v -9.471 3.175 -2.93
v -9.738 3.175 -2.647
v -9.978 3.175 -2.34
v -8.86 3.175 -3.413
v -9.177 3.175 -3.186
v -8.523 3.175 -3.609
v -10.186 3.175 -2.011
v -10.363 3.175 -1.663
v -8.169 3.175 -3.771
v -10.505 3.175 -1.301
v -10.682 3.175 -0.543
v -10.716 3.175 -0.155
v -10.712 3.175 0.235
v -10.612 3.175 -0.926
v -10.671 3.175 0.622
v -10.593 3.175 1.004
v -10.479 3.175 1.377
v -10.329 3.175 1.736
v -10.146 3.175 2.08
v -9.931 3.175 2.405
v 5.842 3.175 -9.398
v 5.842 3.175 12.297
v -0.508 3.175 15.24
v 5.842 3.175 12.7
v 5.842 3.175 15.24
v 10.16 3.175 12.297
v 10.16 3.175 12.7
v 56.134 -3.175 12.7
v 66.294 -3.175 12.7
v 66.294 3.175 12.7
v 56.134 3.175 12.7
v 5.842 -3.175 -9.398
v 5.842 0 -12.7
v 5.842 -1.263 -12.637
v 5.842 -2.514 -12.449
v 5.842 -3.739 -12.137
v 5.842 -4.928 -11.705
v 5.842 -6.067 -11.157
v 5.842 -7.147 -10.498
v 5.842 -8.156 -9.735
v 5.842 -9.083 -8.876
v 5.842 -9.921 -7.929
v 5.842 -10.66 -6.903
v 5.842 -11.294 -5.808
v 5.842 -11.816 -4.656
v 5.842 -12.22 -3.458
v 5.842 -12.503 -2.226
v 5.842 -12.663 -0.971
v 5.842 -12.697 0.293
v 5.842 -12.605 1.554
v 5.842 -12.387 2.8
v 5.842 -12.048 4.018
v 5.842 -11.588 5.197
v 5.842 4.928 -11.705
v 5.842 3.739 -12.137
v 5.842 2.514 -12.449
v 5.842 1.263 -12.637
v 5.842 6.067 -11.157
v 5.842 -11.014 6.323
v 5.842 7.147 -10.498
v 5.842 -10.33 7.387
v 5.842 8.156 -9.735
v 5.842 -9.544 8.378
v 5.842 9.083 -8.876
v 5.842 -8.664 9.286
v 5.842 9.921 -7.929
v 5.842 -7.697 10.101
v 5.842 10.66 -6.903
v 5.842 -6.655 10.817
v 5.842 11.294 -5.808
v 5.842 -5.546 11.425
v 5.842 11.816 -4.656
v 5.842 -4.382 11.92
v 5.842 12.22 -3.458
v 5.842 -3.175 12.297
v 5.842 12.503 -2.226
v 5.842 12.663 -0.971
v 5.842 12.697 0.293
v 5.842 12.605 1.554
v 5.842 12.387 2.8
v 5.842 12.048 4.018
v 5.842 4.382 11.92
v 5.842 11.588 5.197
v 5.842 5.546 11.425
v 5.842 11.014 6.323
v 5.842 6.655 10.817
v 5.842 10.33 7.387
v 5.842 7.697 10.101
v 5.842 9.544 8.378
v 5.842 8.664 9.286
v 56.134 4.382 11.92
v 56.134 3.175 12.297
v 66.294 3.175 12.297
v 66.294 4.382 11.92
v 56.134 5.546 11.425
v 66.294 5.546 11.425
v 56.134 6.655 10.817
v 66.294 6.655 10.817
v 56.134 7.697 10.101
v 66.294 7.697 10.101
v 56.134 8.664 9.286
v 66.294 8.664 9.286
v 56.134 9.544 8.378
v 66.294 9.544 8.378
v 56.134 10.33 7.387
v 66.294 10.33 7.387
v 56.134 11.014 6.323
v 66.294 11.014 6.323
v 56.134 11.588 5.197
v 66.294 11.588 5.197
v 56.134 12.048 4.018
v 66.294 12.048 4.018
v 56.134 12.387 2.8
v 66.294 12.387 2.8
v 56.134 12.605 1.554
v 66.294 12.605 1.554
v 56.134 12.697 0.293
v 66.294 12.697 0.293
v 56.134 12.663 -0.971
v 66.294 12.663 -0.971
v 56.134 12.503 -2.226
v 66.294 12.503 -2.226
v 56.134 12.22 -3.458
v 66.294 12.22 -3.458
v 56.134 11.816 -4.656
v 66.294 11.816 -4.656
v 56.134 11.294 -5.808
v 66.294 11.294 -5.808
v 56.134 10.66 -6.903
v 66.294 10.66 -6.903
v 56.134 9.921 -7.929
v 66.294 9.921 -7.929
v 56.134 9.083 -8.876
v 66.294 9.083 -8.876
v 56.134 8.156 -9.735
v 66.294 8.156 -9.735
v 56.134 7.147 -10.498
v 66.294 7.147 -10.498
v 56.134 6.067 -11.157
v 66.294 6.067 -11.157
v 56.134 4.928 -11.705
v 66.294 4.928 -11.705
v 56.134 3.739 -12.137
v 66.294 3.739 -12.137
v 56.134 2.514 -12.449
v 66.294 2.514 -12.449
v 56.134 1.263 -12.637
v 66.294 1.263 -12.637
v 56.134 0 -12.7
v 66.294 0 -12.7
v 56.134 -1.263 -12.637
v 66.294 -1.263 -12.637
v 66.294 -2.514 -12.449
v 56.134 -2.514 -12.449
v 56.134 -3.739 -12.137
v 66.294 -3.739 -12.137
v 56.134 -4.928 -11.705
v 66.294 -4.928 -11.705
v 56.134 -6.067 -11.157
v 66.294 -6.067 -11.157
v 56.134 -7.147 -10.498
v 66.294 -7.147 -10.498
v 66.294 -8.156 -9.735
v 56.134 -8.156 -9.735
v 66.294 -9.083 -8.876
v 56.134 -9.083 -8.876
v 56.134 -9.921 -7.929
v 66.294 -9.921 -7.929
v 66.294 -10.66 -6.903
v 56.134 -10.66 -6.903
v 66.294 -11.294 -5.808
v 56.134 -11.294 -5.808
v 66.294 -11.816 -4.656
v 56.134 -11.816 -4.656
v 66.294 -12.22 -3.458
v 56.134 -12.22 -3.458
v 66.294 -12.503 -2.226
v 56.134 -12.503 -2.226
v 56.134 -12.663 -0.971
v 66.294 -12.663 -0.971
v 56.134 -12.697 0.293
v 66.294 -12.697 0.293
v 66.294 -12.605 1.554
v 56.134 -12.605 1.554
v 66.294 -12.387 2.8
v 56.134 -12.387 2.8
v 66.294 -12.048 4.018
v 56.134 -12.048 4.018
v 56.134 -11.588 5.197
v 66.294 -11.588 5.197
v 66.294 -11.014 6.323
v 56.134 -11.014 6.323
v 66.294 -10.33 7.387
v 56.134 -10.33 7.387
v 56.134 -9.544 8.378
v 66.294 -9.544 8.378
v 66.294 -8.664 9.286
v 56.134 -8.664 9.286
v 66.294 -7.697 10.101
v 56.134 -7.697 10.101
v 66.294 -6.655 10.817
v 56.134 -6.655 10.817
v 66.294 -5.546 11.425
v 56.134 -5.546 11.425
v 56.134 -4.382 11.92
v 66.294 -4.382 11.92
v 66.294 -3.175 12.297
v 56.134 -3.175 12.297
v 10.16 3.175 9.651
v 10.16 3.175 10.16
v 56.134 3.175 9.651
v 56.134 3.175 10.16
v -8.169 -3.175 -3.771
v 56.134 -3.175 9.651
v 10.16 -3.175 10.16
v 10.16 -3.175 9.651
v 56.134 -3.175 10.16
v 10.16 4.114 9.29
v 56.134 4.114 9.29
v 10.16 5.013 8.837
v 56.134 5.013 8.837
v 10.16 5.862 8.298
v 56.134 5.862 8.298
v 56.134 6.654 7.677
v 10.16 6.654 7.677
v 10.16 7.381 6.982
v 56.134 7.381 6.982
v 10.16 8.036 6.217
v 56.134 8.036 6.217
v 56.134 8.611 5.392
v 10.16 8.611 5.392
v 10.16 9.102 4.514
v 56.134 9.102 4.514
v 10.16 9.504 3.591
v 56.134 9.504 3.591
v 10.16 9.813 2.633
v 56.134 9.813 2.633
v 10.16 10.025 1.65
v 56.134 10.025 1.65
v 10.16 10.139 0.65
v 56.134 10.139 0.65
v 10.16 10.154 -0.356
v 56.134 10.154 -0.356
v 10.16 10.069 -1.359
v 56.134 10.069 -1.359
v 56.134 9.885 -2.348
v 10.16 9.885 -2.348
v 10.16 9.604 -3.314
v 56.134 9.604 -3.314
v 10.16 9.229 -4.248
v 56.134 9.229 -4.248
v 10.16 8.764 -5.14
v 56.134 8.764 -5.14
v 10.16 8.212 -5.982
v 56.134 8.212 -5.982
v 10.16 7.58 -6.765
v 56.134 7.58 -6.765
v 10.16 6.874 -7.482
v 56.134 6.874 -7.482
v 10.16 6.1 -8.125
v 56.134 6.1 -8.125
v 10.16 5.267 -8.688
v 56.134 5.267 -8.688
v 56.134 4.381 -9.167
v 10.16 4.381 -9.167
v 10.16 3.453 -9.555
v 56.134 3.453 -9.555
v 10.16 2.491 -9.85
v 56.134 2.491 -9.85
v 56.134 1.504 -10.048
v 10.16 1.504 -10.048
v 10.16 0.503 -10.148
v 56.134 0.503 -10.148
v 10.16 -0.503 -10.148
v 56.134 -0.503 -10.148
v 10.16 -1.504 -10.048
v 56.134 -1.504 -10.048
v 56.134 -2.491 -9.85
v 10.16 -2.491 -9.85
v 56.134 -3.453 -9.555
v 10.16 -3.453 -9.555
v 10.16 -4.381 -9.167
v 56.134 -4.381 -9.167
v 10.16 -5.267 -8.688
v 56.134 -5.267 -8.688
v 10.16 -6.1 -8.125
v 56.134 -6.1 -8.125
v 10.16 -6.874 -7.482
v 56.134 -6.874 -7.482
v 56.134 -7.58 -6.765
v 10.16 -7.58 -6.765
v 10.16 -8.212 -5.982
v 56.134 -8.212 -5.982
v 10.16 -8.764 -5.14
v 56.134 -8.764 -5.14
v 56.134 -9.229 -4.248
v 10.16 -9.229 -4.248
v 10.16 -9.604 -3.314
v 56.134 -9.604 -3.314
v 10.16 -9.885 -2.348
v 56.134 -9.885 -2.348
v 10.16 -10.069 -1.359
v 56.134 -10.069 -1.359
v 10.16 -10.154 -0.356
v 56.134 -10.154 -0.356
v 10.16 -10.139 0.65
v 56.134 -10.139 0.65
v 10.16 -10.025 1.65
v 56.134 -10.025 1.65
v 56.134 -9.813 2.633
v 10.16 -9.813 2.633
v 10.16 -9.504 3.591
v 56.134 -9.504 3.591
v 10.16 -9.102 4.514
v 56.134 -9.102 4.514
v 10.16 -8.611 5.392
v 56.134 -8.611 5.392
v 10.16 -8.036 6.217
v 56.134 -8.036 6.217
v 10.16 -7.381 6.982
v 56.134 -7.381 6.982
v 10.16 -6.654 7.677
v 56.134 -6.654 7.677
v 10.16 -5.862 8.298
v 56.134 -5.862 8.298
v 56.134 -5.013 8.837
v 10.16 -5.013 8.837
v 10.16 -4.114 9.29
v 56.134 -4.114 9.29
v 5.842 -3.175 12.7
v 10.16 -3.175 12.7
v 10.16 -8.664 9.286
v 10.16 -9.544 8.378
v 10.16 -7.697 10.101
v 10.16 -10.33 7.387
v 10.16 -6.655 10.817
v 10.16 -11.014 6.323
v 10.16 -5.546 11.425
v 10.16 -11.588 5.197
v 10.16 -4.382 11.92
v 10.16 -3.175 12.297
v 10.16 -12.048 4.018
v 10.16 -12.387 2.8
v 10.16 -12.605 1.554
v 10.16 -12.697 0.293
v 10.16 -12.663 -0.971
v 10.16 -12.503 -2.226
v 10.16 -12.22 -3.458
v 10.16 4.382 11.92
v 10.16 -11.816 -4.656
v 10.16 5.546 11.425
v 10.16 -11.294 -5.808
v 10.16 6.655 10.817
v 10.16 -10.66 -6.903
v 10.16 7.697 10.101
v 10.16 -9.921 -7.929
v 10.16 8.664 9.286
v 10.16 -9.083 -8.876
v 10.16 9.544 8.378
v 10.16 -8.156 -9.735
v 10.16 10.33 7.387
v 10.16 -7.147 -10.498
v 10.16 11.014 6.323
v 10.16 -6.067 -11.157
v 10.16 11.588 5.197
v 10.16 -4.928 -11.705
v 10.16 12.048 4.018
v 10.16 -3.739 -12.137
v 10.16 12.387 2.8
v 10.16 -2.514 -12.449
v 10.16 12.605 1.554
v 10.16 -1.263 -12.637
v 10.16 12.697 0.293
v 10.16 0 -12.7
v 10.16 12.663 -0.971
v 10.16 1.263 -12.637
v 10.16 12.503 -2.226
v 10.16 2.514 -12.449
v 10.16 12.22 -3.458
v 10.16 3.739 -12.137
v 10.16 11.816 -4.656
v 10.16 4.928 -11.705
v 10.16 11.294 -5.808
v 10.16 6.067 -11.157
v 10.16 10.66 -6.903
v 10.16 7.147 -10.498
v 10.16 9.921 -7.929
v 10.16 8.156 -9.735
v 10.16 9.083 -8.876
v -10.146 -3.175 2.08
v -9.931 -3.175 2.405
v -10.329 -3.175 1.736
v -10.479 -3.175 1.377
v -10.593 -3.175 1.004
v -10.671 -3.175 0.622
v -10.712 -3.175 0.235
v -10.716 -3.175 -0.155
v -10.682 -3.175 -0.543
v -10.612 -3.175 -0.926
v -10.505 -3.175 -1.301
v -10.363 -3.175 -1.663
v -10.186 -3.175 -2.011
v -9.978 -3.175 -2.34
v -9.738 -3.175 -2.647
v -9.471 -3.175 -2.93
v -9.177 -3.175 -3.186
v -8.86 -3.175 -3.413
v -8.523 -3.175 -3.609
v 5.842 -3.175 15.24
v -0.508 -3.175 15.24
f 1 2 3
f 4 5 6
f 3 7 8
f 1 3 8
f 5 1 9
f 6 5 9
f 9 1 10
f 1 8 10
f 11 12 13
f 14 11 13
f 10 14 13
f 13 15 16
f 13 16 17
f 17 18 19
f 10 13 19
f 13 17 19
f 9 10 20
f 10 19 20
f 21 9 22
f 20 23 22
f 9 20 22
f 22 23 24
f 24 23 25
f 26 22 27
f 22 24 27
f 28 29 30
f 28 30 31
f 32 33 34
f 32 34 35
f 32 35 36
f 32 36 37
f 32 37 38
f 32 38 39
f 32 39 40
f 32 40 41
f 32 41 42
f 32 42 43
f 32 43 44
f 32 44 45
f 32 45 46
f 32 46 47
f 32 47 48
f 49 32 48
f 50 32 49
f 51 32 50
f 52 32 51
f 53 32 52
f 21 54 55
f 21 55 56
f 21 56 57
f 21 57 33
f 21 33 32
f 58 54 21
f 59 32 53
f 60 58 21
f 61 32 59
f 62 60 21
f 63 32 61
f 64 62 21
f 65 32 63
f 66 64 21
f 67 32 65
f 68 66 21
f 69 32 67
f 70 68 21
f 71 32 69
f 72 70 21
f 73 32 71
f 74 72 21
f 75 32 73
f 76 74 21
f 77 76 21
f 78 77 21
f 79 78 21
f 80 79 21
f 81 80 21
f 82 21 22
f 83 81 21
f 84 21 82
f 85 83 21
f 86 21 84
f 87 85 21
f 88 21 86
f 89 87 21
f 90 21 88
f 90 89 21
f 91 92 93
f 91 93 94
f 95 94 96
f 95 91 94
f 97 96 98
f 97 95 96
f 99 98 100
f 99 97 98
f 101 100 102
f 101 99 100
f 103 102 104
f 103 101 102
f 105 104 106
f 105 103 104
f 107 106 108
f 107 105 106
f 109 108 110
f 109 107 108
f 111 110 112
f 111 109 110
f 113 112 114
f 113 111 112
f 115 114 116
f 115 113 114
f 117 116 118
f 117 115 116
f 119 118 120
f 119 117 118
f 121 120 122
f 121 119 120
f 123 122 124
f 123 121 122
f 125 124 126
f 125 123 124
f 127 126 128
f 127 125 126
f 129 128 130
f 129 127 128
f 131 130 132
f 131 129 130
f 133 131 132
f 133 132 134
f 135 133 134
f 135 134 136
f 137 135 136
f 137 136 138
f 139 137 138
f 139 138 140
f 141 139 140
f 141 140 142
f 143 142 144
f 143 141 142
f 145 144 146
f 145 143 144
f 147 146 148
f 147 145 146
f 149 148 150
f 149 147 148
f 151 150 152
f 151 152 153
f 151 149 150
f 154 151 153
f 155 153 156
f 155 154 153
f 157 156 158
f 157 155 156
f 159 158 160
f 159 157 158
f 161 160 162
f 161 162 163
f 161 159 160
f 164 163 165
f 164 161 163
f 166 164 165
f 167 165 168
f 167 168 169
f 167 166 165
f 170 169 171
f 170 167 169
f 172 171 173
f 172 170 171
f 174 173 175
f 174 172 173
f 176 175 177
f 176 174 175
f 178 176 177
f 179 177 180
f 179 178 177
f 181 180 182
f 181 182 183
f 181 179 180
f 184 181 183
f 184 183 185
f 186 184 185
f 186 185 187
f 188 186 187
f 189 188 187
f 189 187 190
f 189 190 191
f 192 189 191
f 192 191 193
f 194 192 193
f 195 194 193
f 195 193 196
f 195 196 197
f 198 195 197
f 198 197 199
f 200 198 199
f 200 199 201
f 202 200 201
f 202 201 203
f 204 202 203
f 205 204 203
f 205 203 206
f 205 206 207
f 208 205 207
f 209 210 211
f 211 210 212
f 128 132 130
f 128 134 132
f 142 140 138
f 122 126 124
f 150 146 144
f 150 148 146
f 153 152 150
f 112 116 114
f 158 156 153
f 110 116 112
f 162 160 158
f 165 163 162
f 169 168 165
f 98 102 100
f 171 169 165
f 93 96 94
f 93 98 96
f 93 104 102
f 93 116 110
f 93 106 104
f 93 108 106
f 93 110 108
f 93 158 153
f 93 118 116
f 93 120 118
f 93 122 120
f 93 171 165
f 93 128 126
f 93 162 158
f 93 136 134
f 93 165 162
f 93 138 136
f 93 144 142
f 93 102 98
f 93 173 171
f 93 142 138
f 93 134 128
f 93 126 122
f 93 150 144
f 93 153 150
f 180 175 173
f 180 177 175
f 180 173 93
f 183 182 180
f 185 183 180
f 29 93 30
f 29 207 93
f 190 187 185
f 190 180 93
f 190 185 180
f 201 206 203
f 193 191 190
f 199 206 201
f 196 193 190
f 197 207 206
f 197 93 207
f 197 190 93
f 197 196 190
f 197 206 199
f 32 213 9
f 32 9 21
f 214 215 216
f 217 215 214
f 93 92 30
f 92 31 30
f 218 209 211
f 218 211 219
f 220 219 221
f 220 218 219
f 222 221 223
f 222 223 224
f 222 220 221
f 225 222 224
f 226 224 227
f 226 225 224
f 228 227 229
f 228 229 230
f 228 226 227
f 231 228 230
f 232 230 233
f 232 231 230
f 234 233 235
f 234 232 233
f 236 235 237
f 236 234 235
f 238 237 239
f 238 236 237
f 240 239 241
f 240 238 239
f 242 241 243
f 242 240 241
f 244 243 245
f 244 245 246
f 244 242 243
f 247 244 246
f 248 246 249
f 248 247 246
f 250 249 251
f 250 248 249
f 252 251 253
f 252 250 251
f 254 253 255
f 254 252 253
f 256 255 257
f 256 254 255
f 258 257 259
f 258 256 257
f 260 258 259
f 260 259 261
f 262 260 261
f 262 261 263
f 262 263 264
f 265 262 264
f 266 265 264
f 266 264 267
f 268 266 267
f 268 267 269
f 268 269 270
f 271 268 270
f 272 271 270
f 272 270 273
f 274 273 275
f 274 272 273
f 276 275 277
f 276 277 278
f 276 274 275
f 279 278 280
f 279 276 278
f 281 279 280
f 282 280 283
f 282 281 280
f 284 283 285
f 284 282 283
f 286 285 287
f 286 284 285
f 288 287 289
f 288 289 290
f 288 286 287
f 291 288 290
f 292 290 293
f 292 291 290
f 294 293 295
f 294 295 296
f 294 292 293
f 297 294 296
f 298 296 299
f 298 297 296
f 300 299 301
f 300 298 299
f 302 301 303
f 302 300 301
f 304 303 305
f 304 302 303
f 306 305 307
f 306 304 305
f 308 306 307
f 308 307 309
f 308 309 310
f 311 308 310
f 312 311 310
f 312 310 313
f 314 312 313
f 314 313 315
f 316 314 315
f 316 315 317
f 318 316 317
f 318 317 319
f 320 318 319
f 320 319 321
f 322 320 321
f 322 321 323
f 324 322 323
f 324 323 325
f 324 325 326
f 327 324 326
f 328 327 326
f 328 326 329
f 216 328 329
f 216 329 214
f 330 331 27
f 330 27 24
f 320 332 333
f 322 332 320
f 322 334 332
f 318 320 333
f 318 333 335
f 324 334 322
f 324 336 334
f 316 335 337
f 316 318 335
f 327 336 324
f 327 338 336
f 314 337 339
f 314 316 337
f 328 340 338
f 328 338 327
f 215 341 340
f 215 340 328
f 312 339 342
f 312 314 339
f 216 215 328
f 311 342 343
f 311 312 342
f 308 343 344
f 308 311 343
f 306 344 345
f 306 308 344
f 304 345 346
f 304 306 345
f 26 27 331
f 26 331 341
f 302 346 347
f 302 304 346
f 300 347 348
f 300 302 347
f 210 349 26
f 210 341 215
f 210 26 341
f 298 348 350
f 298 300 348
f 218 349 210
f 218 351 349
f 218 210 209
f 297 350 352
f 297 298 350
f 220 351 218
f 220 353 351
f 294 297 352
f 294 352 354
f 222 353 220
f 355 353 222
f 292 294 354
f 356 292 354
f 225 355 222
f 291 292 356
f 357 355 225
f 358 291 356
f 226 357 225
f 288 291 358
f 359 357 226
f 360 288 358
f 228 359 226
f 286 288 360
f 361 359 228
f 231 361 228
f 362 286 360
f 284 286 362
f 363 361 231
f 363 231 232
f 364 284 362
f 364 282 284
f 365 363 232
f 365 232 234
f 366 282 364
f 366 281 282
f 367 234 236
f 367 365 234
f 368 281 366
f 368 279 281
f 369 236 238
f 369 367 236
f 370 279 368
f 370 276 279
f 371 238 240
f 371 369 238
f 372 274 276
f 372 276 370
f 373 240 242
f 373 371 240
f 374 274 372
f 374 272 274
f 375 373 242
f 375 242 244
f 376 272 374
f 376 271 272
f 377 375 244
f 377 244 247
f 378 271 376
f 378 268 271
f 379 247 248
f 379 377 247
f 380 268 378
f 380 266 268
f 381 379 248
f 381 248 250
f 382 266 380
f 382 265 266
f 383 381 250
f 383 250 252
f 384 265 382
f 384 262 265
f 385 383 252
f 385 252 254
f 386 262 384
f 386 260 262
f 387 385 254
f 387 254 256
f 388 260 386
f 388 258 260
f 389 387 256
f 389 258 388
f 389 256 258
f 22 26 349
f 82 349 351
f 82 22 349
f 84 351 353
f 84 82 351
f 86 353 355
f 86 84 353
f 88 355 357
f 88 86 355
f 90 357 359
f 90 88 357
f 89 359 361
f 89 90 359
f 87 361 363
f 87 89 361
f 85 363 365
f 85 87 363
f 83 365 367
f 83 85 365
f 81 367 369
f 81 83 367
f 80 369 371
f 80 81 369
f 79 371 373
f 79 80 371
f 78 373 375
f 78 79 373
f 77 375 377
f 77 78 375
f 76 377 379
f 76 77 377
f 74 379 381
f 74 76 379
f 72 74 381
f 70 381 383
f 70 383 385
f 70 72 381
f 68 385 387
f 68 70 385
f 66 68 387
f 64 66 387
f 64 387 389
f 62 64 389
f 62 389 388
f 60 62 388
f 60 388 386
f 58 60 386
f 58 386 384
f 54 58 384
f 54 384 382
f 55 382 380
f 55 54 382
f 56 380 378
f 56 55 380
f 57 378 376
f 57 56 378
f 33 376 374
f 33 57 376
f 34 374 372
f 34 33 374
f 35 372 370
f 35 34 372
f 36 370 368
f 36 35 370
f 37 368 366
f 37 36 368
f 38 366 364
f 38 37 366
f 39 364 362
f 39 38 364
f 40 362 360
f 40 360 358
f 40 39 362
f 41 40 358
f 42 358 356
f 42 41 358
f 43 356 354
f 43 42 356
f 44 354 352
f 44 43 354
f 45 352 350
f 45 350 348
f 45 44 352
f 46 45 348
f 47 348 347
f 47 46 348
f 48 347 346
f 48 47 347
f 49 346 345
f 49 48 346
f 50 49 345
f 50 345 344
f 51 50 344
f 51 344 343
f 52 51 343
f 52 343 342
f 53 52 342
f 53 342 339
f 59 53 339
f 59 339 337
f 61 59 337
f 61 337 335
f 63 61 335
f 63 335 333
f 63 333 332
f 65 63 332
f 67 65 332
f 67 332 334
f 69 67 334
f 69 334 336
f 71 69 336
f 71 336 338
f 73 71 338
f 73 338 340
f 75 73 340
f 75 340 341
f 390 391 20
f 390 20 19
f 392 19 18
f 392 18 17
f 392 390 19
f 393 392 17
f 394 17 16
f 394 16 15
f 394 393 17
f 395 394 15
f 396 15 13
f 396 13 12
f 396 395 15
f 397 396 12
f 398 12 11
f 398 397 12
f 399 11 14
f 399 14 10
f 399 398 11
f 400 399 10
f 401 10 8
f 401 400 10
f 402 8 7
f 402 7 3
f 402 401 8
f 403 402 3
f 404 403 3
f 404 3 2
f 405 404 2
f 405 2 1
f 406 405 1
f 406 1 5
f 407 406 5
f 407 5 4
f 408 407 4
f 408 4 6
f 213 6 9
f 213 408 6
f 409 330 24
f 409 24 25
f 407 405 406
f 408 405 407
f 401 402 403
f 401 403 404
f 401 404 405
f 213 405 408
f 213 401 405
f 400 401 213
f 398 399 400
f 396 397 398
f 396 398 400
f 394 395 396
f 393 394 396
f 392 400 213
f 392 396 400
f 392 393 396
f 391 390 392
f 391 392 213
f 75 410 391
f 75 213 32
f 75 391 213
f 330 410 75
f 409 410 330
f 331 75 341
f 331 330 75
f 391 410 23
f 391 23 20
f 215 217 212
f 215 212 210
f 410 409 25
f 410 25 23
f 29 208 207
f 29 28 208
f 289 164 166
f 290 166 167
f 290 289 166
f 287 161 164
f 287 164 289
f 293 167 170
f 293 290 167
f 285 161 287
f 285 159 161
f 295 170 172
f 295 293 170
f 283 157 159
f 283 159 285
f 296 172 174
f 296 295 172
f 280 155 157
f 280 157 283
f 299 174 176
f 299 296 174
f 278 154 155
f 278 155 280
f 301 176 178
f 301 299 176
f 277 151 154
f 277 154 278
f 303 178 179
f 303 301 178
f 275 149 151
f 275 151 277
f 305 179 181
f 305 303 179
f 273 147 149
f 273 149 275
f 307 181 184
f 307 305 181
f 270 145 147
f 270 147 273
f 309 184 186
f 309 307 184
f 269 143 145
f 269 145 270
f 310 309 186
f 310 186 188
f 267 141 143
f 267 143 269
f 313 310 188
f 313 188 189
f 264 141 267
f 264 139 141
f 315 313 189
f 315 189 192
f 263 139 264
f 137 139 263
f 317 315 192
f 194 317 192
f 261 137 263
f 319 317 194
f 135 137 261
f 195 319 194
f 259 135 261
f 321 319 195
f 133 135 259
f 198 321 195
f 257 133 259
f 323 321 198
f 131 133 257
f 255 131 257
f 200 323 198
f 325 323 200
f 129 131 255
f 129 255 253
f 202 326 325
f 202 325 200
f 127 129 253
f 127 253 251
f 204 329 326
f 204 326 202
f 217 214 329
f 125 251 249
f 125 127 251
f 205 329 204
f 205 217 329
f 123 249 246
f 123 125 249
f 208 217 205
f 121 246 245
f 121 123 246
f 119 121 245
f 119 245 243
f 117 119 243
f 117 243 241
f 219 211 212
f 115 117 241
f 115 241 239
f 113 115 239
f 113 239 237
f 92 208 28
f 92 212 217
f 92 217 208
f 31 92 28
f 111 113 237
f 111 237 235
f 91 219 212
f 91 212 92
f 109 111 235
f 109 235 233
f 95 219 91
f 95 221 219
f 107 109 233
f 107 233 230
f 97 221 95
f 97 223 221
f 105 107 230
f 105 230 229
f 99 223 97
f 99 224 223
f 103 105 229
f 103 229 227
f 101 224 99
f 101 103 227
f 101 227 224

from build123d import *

# Parameters (mm, degrees)
F0_W     = 5.842
F0_H     = 12.7
F0_R     = 1.524
F2_DEPTH = 3.175


with BuildPart() as f1:
    # F0 (on Front) → F1 (revolve)
    with BuildSketch(Plane.XZ):
        Polygon((5.842, 12.7), (5.842, 0), (66.294, 0), (66.294, 12.7), (56.134, 12.7), (56.134, 10.16), (10.16, 10.16), (10.16, 12.7), align=None)
    revolve(axis=Axis((33.147, 0, 0), (-1, 0, 0)))

    # F0 (on Front) → F2 (join, symmetric)
    with BuildSketch(Plane.XZ):
        Polygon((5.842, 12.7), (5.842, 0), (66.294, 0), (66.294, 12.7), (56.134, 12.7), (56.134, 10.16), (10.16, 10.16), (10.16, 12.7), align=None)
        with BuildLine():
            Line((-2.5908, 0), (0, 0))
            Line((0, 0), (0, 12.7))
            Line((0, 12.7), (5.842, 12.7))
            Line((5.842, 12.7), (5.842, 15.24))
            Line((5.842, 15.24), (-0.508, 15.24))
            Line((-0.508, 15.24), (-9.9307574264, 2.405036162))
            ThreePointArc((-9.9307574264, 2.405036162), (-5.3893741786, 3.8619675672), (-2.5908, 0))
        make_face()
        with Locations((2.921, 6.35)):
            Rectangle(F0_W, F0_H)
        with BuildLine():
            Line((5.842, 0), (0, 0))
            Line((0, 0), (-2.5908, 0))
            ThreePointArc((-2.5908, 0), (-4.3787043805, -3.3668211611), (-8.1692865802, -3.7712632364))
            Line((-8.1692865802, -3.7712632364), (5.842, -9.398))
            Line((5.842, -9.398), (5.842, 0))
        make_face()
        with BuildLine():
            ThreePointArc((-8.1692865802, -3.7712632364), (-4.3787043805, -3.3668211611), (-2.5908, 0))
            ThreePointArc((-2.5908, 0), (-5.3893741786, 3.8619675672), (-9.9307574264, 2.405036162))
            ThreePointArc((-9.9307574264, 2.405036162), (-10.5629654276, -1.1146026154), (-8.1692865802, -3.7712632364))
        make_face()
        with Locations((-6.6548, 0)):
            Circle(F0_R, mode=Mode.SUBTRACT)
        with Locations((-6.6548, 0)):
            Circle(F0_R)
    extrude(amount=F2_DEPTH, both=True)


solid = f1.part
